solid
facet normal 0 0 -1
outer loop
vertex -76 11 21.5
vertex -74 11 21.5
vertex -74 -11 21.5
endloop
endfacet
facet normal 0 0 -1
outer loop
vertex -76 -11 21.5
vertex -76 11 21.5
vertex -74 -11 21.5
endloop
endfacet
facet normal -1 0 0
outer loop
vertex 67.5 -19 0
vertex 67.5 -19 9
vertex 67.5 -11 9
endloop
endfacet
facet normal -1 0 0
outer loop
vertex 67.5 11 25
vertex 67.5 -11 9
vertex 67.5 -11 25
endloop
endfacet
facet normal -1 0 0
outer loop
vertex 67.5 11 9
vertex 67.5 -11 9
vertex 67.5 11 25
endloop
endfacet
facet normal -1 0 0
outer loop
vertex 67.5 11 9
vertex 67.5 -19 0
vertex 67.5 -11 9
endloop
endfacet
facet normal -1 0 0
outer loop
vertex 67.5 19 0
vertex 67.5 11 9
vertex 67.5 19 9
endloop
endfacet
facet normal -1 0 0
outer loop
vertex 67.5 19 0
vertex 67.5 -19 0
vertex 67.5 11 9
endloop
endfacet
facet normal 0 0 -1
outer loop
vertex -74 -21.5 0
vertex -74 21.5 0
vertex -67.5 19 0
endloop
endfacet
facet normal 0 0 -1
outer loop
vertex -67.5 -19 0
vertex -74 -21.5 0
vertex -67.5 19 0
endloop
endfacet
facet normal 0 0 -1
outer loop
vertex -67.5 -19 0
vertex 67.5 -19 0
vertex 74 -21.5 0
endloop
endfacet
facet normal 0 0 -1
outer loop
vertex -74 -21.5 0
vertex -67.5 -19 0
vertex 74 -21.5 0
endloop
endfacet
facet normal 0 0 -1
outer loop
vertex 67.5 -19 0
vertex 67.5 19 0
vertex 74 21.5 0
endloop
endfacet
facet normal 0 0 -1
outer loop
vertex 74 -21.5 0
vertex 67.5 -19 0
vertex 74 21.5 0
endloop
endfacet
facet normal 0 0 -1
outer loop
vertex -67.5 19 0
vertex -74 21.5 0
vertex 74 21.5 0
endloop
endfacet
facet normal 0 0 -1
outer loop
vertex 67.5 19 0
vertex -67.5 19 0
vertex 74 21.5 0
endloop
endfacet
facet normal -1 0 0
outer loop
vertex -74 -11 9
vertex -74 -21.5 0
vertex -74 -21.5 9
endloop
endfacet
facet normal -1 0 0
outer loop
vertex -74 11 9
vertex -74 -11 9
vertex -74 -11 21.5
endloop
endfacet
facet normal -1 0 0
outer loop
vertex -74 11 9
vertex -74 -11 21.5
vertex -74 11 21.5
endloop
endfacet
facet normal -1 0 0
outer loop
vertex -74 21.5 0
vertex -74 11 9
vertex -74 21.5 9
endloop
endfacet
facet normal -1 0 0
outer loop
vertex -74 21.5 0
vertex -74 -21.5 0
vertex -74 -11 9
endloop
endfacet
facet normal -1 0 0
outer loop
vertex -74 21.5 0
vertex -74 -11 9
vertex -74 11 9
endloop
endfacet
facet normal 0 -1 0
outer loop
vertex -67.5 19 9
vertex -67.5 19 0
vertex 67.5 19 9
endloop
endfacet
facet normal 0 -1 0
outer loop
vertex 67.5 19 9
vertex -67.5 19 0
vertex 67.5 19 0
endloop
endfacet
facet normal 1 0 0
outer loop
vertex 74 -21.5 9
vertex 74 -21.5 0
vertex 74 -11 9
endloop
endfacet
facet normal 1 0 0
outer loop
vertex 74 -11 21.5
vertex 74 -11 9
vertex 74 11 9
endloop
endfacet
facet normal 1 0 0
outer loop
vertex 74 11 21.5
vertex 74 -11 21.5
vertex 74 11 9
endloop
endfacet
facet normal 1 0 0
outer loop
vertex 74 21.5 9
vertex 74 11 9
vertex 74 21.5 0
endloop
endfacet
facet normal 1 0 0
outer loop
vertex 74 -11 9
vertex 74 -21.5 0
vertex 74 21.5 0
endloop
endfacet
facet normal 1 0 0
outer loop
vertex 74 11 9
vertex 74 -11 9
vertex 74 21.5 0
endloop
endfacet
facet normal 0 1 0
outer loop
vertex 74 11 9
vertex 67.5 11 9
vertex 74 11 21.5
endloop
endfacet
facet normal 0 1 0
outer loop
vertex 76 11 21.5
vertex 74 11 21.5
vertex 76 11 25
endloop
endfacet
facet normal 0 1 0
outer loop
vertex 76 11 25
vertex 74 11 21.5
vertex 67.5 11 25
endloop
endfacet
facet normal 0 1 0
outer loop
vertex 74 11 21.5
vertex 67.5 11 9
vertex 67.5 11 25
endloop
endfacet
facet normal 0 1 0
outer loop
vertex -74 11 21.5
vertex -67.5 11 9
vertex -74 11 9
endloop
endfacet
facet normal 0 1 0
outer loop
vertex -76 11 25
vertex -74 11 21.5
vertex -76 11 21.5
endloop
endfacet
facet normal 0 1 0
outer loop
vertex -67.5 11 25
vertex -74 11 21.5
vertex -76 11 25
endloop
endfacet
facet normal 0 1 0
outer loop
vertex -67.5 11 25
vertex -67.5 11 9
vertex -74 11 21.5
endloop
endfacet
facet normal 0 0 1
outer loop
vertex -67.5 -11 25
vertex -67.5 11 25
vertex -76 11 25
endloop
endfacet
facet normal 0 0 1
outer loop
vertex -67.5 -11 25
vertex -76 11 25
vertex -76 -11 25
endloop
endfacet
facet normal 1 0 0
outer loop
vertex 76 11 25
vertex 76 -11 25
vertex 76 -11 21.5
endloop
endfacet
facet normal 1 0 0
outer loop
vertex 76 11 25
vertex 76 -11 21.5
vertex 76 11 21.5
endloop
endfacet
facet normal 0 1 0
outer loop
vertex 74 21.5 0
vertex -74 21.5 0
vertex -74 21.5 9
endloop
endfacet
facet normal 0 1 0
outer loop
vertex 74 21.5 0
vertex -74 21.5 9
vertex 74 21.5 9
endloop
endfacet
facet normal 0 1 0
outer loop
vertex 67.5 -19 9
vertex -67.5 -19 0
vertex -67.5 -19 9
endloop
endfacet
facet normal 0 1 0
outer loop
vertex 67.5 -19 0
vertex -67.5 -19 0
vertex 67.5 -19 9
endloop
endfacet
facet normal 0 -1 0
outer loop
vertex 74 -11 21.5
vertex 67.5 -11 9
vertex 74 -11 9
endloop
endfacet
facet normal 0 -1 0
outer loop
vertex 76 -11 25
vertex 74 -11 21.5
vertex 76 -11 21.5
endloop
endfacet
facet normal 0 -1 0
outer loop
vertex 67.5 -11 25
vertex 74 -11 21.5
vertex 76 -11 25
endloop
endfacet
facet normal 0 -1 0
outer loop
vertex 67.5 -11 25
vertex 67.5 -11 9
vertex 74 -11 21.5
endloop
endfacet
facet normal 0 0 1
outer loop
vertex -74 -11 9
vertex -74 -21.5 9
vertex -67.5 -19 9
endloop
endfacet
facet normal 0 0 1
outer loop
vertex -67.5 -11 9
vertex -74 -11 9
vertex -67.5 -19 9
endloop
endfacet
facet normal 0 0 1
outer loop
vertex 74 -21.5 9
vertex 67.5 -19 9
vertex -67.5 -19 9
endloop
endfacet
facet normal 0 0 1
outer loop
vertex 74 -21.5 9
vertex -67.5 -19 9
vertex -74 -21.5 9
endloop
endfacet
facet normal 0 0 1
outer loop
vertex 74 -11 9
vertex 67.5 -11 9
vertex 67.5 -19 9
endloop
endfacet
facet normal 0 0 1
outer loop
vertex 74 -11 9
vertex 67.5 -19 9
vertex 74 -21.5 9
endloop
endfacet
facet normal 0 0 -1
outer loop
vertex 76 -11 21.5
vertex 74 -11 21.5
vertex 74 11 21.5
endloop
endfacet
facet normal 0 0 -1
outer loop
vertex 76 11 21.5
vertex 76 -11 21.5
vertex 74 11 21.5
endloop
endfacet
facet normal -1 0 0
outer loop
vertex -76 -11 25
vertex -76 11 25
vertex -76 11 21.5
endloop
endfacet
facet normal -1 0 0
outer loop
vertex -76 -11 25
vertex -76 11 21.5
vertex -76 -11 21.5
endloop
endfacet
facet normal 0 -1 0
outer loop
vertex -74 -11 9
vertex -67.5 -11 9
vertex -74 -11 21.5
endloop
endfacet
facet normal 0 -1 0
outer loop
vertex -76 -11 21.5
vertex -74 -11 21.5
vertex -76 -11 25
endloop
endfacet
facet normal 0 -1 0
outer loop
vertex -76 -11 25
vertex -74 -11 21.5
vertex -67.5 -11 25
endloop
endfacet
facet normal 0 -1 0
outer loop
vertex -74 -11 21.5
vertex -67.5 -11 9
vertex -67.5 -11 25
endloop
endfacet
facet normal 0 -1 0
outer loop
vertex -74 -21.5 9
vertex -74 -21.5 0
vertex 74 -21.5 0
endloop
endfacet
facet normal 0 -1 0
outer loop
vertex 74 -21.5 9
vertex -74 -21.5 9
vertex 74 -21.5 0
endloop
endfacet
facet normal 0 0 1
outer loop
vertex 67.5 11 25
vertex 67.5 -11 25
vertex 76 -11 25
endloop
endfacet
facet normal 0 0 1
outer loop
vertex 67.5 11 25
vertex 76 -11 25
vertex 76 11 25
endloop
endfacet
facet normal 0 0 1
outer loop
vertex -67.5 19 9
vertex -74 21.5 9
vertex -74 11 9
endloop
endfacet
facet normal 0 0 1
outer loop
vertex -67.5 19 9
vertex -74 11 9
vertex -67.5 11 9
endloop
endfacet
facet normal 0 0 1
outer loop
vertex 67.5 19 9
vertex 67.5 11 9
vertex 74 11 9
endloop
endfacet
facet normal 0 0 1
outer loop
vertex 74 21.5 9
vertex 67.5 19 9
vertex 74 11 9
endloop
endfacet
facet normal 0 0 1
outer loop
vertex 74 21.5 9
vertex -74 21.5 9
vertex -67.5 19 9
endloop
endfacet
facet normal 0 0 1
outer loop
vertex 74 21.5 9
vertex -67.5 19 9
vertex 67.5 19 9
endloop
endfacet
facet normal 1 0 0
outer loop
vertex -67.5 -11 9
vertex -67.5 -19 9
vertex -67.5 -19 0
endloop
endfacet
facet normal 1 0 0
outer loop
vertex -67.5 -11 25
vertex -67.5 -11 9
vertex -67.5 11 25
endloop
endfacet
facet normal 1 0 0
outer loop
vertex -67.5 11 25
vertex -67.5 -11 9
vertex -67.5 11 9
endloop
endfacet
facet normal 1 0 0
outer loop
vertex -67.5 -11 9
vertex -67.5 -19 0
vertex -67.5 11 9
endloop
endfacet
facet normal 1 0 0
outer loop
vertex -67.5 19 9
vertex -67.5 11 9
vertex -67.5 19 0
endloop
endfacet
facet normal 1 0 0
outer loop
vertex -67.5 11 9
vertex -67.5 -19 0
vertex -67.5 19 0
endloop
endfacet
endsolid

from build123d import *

# Parameters (mm, degrees)
F0_W     = 148
F0_H     = 43
F0_W_2   = 135
F0_H_2   = 38
F1_DEPTH = 9
F2_W     = 6.5
F2_H     = 22
F3_DEPTH = 16
F4_W     = 22
F4_H     = 3.5
F5_DEPTH = 2
F6_W     = 22
F6_H     = 3.5
F7_DEPTH = 2


with BuildPart() as f1:
    # F0 (on Top) → F1 (new body)
    with BuildSketch(Plane.XY):
        Rectangle(F0_W, F0_H)
        Rectangle(F0_W_2, F0_H_2, mode=Mode.SUBTRACT)
    extrude(amount=F1_DEPTH)

    # F2 (on face) → F3 (join)
    with BuildSketch(Plane.XY.offset(9)):
        with Locations((-70.75, 0)):
            Rectangle(F2_W, F2_H)
        with Locations((70.75, 0)):
            Rectangle(F2_W, F2_H)
    extrude(amount=F3_DEPTH)

    # F4 (on face) → F5 (join)
    with BuildSketch(Plane(origin=(-74, 0, 0), x_dir=(0, -1, 0), z_dir=(-1, 0, 0))):
        with Locations((0, 23.25)):
            Rectangle(F4_W, F4_H)
    extrude(amount=F5_DEPTH)

    # F6 (on face) → F7 (join)
    with BuildSketch(Plane.YZ.offset(74)):
        with Locations((0, 23.25)):
            Rectangle(F6_W, F6_H)
    extrude(amount=F7_DEPTH)


with BuildPart() as f8_1:
    # F8: copy of F1
    add(f1.part)


solid = f8_1.part
